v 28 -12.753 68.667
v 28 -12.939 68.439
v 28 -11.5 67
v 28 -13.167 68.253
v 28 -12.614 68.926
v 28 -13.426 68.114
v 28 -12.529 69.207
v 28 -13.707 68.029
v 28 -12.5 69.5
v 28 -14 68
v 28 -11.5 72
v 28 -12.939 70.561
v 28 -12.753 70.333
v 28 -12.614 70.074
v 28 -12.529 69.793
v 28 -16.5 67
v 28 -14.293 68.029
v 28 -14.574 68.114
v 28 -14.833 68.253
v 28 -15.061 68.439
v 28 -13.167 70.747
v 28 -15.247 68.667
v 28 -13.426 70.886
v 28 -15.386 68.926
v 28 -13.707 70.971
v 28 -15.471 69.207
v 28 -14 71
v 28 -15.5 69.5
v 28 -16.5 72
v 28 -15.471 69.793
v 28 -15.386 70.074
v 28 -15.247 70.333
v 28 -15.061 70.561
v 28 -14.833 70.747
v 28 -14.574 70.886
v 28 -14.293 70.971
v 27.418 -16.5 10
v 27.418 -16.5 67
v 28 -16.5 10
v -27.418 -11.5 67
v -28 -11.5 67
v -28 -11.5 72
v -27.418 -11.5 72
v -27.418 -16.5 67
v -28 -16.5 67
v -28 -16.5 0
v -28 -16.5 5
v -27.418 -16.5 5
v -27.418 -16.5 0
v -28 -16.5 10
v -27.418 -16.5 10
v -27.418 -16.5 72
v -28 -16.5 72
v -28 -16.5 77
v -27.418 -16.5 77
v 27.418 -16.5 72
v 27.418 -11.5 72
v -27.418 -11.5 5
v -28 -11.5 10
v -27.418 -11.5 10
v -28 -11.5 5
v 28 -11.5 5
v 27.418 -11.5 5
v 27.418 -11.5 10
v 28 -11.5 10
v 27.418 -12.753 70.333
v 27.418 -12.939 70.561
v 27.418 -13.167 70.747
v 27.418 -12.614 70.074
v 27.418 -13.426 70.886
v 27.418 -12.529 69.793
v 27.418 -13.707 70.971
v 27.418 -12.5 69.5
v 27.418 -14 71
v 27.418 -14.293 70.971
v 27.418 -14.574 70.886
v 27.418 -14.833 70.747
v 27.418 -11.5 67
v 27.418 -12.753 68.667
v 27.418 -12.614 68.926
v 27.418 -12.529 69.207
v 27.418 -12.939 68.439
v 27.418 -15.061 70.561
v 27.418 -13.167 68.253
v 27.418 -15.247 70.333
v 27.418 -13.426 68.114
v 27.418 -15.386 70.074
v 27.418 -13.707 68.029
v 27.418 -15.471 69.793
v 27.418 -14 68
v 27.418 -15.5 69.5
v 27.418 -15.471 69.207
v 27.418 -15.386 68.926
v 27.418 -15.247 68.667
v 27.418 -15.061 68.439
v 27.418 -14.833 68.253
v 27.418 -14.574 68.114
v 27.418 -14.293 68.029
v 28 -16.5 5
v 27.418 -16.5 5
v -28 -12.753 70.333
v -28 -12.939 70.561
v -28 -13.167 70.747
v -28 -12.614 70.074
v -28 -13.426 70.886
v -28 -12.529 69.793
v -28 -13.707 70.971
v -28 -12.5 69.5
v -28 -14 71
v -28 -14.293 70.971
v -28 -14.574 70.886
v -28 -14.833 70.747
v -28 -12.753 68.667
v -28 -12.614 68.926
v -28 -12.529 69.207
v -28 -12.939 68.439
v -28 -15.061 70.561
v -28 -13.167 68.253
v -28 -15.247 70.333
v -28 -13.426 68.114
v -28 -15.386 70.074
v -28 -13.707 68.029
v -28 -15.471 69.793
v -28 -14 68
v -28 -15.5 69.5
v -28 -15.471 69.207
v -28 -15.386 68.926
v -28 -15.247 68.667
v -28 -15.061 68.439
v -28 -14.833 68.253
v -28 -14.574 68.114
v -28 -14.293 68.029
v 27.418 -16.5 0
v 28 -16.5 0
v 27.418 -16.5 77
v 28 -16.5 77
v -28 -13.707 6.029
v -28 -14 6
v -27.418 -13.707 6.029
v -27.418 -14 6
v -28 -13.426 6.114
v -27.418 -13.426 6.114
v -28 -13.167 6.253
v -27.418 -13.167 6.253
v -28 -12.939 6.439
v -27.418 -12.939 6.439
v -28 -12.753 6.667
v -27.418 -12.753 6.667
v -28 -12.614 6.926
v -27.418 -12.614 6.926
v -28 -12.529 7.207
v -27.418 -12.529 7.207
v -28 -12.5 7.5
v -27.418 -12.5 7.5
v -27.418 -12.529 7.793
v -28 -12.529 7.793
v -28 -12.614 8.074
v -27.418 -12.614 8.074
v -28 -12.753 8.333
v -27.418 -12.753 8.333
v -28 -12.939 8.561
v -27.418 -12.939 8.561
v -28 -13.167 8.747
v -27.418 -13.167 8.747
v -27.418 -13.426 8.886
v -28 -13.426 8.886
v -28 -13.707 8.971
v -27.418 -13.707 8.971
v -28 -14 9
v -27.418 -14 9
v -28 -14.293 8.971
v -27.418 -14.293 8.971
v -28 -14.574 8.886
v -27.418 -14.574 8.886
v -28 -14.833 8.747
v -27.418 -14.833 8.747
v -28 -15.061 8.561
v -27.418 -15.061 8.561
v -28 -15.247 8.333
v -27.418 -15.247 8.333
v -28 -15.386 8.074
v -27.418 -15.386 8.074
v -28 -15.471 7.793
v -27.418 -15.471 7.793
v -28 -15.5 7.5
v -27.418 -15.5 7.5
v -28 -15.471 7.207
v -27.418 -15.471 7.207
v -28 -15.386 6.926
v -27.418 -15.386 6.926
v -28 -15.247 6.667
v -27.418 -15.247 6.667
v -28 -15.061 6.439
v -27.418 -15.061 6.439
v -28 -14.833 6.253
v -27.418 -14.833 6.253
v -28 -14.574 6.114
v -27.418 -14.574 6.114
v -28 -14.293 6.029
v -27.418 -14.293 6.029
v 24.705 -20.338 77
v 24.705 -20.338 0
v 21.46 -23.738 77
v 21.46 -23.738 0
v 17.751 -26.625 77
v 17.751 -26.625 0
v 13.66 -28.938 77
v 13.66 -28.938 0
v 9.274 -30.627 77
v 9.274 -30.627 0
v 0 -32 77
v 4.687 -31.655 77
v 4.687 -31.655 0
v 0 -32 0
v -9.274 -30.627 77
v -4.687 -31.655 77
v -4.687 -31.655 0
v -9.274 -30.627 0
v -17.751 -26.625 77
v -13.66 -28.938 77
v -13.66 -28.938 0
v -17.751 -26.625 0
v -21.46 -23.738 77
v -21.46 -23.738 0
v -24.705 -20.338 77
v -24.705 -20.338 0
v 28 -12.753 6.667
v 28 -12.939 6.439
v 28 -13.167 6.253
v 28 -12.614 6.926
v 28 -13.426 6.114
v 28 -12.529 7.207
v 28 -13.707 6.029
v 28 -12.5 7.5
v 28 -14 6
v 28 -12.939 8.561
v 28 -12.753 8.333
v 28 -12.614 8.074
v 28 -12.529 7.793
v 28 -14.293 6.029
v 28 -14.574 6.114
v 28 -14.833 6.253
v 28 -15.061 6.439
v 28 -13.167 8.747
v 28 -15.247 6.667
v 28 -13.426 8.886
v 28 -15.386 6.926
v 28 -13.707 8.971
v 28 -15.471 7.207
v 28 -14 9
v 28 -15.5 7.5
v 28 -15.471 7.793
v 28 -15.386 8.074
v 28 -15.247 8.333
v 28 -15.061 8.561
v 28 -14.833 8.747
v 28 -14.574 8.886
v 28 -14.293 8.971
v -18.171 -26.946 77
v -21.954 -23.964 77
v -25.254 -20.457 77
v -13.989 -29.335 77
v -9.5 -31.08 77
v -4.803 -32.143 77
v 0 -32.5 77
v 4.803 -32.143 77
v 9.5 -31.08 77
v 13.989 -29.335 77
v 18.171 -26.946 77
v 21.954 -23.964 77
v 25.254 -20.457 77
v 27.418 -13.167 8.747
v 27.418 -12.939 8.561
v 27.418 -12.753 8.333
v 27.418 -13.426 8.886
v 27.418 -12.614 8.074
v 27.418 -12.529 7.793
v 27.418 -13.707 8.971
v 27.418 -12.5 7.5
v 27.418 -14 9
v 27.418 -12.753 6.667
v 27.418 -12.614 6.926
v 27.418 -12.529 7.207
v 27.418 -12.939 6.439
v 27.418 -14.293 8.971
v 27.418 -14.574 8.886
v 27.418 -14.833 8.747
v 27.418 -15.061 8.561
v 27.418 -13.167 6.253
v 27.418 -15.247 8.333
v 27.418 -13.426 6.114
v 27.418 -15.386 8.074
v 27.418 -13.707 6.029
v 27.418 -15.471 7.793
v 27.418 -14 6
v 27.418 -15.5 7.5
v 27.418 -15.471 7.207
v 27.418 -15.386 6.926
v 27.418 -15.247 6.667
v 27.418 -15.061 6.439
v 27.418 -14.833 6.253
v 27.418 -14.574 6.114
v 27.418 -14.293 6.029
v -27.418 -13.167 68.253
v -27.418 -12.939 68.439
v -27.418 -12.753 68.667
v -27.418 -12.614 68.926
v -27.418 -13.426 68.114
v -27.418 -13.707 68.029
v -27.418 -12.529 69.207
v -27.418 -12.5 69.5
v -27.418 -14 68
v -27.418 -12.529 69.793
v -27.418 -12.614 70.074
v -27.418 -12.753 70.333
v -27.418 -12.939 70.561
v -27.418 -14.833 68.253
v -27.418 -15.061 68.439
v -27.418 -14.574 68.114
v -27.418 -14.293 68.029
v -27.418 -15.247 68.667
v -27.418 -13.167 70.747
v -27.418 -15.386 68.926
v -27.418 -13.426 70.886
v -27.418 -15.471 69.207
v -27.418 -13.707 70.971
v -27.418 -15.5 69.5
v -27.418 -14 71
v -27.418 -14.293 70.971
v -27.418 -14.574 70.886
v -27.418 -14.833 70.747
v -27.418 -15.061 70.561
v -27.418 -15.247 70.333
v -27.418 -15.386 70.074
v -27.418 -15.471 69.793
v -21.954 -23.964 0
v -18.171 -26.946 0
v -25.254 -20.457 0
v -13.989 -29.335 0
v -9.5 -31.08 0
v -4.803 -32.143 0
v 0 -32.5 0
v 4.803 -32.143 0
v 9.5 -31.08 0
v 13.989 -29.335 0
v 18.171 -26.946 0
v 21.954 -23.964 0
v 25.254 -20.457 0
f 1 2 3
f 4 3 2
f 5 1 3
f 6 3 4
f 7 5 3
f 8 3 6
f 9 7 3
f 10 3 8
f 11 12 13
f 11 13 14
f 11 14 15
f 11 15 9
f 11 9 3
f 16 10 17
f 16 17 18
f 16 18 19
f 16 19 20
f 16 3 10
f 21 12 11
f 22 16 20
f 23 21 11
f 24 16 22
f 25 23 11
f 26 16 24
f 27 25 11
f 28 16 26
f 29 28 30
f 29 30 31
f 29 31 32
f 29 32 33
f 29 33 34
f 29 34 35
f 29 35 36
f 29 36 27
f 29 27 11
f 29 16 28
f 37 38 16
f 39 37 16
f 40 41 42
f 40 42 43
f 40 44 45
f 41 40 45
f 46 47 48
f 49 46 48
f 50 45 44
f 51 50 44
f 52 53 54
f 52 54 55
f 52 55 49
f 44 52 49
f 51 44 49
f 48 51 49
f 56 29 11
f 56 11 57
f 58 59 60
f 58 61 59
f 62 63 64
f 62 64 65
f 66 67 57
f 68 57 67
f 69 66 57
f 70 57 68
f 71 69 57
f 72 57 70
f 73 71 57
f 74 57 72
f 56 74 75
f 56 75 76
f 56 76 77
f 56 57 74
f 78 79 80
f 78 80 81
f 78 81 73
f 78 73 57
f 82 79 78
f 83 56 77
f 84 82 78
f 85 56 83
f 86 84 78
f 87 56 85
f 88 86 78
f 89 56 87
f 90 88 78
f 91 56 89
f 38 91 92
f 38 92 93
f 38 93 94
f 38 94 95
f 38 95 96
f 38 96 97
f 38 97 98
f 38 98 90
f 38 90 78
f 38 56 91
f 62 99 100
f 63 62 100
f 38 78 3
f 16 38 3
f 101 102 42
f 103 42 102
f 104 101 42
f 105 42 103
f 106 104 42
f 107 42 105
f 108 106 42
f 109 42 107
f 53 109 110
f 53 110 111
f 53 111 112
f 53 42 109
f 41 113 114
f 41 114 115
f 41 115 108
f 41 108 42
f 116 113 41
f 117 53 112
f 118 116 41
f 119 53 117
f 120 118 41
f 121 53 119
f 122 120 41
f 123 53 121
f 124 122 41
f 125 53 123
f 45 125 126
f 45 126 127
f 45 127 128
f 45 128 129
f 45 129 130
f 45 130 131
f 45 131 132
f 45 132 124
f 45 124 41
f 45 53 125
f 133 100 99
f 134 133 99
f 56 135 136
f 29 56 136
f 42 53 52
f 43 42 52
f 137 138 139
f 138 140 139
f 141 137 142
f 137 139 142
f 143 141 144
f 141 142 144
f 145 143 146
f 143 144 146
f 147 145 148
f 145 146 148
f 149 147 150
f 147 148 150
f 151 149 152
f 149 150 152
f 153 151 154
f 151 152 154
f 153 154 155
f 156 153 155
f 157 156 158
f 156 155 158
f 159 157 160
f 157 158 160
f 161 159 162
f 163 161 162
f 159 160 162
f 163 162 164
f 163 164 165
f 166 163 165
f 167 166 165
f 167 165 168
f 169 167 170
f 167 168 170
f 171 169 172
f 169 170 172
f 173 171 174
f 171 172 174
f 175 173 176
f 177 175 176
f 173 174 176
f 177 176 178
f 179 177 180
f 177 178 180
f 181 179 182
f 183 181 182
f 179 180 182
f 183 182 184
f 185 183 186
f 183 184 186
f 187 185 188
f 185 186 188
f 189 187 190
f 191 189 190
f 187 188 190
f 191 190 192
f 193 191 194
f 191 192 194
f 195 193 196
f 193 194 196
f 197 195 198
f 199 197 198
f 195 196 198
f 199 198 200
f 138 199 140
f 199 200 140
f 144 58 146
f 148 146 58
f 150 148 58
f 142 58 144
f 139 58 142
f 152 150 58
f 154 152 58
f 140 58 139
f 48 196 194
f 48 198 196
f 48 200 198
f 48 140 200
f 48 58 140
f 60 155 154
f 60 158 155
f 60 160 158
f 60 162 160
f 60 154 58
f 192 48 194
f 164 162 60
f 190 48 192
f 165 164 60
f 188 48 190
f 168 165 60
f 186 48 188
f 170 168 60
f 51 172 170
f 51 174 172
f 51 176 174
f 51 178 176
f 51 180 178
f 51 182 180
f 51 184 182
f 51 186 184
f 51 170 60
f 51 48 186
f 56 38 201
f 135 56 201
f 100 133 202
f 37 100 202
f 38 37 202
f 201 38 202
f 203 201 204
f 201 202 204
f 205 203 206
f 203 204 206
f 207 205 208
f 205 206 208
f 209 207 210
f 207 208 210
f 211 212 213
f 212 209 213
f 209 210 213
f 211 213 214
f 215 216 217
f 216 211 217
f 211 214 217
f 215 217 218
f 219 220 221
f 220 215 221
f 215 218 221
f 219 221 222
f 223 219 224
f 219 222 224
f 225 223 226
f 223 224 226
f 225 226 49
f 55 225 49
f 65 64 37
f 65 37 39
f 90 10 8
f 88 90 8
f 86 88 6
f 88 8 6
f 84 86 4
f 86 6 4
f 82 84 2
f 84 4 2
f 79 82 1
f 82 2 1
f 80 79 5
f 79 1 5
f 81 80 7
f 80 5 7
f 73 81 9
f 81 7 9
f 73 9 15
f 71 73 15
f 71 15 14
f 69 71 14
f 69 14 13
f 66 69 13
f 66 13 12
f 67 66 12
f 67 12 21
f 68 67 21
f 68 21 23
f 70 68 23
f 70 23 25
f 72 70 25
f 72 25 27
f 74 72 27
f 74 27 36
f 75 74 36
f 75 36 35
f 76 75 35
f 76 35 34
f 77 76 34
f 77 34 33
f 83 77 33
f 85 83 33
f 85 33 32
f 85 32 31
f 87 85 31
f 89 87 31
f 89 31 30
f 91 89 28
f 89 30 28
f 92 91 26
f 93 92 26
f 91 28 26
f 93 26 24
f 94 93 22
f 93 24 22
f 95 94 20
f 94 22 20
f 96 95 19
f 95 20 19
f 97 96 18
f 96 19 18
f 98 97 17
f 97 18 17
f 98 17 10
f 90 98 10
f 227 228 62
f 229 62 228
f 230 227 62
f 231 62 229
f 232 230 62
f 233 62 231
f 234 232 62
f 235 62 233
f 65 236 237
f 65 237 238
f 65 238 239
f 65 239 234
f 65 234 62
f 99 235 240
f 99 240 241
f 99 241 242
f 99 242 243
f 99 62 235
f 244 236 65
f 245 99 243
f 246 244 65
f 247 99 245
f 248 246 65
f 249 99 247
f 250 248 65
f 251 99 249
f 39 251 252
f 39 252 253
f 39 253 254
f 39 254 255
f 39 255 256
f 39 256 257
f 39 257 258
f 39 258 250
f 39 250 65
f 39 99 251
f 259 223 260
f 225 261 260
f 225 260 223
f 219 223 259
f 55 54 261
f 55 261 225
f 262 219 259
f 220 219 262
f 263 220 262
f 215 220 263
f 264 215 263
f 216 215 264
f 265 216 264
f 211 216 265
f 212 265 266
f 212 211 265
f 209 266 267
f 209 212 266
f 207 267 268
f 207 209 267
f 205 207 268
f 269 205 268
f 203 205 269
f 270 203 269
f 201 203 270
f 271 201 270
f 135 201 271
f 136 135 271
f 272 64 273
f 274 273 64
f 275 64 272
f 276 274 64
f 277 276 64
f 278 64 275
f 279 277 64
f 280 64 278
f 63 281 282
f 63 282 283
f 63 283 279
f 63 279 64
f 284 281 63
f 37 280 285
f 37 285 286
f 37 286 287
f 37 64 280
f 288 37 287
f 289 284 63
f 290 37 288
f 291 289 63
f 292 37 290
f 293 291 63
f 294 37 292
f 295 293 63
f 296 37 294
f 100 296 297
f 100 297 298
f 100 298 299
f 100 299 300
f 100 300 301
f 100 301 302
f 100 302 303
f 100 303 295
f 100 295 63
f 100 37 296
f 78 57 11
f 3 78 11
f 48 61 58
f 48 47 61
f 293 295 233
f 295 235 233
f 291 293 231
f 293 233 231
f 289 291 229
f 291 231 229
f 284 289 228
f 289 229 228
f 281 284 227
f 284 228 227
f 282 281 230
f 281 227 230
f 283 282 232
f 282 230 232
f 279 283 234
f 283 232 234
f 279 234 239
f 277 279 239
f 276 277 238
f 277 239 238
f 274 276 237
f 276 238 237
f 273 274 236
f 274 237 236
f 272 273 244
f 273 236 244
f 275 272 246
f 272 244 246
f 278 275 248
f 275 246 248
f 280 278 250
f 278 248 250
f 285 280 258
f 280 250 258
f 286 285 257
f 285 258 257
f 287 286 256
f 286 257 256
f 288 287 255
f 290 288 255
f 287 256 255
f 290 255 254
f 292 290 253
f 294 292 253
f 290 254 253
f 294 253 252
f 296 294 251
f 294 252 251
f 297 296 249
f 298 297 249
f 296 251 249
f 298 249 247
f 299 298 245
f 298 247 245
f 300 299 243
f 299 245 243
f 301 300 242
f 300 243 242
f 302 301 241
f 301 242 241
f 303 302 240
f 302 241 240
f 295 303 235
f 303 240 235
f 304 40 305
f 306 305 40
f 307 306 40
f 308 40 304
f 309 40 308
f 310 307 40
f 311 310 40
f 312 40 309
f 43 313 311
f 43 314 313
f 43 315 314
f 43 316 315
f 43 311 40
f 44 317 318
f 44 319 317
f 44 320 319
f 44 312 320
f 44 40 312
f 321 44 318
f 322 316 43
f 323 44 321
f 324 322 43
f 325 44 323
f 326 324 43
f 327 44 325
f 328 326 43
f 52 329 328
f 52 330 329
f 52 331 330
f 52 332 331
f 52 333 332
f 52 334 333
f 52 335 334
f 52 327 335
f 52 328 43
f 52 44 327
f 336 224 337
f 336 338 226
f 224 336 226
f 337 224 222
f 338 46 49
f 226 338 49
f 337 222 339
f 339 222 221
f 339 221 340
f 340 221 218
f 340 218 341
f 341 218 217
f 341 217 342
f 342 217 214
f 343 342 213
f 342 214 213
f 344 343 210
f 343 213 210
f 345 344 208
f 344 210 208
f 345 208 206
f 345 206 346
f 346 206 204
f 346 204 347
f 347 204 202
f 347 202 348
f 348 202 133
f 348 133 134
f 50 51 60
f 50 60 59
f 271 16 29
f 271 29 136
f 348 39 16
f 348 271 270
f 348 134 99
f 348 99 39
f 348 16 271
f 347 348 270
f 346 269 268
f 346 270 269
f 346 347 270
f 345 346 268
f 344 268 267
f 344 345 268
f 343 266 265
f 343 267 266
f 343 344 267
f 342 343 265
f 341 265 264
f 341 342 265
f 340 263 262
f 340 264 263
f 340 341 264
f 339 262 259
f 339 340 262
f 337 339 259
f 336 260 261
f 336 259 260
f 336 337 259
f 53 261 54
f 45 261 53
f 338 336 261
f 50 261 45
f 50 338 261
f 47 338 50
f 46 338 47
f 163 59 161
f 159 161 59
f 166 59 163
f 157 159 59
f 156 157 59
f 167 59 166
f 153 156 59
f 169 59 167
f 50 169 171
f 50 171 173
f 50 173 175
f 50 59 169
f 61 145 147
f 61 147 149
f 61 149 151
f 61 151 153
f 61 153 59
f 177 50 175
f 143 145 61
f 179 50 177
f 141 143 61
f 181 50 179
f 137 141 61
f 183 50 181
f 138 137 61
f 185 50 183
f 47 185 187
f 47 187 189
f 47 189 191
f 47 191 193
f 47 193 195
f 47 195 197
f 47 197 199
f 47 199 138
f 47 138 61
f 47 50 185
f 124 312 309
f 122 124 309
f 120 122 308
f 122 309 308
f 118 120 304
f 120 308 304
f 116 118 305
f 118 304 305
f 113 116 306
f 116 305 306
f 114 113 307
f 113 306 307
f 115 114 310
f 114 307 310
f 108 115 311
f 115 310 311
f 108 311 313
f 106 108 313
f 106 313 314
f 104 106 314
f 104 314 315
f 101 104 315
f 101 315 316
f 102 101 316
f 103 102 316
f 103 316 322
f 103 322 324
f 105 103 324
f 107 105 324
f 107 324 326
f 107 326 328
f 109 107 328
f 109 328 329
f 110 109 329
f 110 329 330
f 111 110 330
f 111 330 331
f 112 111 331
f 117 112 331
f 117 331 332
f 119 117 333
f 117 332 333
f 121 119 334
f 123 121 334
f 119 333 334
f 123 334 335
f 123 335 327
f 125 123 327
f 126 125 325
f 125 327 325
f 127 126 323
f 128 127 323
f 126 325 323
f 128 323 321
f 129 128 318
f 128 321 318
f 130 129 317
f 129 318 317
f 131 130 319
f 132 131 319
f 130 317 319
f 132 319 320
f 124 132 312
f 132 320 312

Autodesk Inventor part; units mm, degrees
ref_plane "YZ Plane" through (0, 0, 0) normal (1, 0, 0) x (0, 1, 0)
ref_plane "XZ Plane" through (0, 0, 0) normal (0, 1, 0) x (-1, 0, 0)
ref_plane "XY Plane" through (0, 0, 0) normal (0, 0, 1) x (1, 0, 0)
sketch "Szkic1" plane through (0, 0, 0) normal (0, 0, 1) x (1, 0, 0)
  circle A0 centre (0, 0) radius 32.5
  circle A1 centre (0, 0) radius 32
  dimension "d0" = 65
  dimension "d1" = 64
extrude "Wyciągnięcie proste1" add sketch "Szkic1" along normal blind 77
sketch "Szkic2" plane through (0, 0, 77) normal (0, 0, 1) x (1, 0, 0)
  line L0 (0, 0) -> (-28, 0)
  line L1 (-28, 0) -> (-28, 15.4919)
  circle A0 centre (0, 0) radius 32 projected
  line L2 (-28, 0) -> (-28, -16.5)
  circle A1 centre (0, 0) radius 32.5 projected
  line L3 (-28, -16.5) -> (28, -16.5)
  line L4 (52.8927, -0.6882) -> (26.703, 44.9724)
  line L5 (26.703, 44.9724) -> (-31.7097, 42.3671)
  line L6 (-31.7097, 42.3671) -> (-48.5067, -13.9887)
  line L7 (-48.5067, -13.9887) -> (-28, -16.5)
  line L8 (28, -16.5) -> (52.8927, -0.6882)
  dimension "d4" = 28
extrude "Wyciągnięcie proste2" cut sketch "Szkic2" against normal blind 77 contours L2 A0 L1 | L1 A0 L3 L2 | A0 L2 A1 L3 | A0 L3 L2 | L7 L6 L5 L4 L8 A1
sketch "Szkic3" plane through (-27.4181, -16.5, 77) normal (0, 1, 0) x (1, 0, 0)
  line L0 (-0.5819, 0) -> (55.4181, 0) projected
  line L1 (-0.5819, 0) -> (-0.5819, 5)
  line L2 (-0.5819, 0) -> (-0.5819, 77) projected
  line L3 (-0.5819, 5) -> (0, 5)
  line L4 (0, 77) -> (0, 0) projected
  line L5 (0, 5) -> (0, 10)
  line L6 (0, 10) -> (-0.5819, 10)
  line L7 (-0.5819, 10) -> (-0.5819, 5)
  line L8 (-0.5819, 77) -> (55.4181, 77) projected
  line L9 (-0.5819, 77) -> (-0.5819, 72)
  line L10 (-0.5819, 72) -> (0, 72)
  line L11 (0, 72) -> (0, 67)
  line L12 (0, 67) -> (-0.5819, 67)
  line L13 (-0.5819, 67) -> (-0.5819, 72)
  line L14 (55.4181, 77) -> (55.4181, 72)
  line L15 (55.4181, 77) -> (55.4181, 0) projected
  line L16 (55.4181, 72) -> (54.8361, 72)
  line L17 (54.8361, 0) -> (54.8361, 77) projected
  line L18 (54.8361, 72) -> (54.8361, 67)
  line L19 (54.8361, 67) -> (55.4181, 67)
  line L20 (55.4181, 67) -> (55.4181, 72)
  line L21 (55.4181, 0) -> (55.4181, 5)
  line L22 (55.4181, 5) -> (54.8361, 5)
  line L23 (54.8361, 5) -> (54.8361, 10)
  line L24 (54.8361, 10) -> (55.4181, 10)
  line L25 (55.4181, 10) -> (55.4181, 5)
  point P0 (27.4181, 77)
  dimension "d7" = 5
  dimension "d8" = 5
  dimension "d9" = 5
  dimension "d10" = 5
  dimension "d11" = 5
  dimension "d12" = 5
  dimension "d13" = 5
  dimension "d14" = 5
extrude "Wyciągnięcie proste3" add sketch "Szkic3" along normal blind 5 contours L2 L6 L4 L3 | L17 L24 L15 L22 | L2 L10 L4 L12 | L17 L16 L15 L19
sketch "Szkic4" plane through (28, -16.5, 67) normal (1, 0, 0) x (0, 0, -1)
  line L0 (57, 0) -> (57, 5) projected
  line L1 (62, 0) -> (62, 5) projected
  line L2 (57, 0) -> (62, 5)
  line L3 (62, 5) -> (57, 5) projected
  line L4 (62, 5) -> (57, 5)
  line L5 (57, 5) -> (62, 0)
  line L6 (0, 0) -> (-5, 0) projected
  line L7 (-5, 5) -> (0, 5) projected
  line L8 (-5, 0) -> (0, 5)
  line L9 (0, 5) -> (-5, 5)
  line L10 (-5, 5) -> (0, 0)
  circle A0 centre (-2.5, 2.5) radius 1.5
  circle A1 centre (59.5, 2.5) radius 1.5
  point P0 (67, 16.5)
  dimension "d17" = 3
  dimension "d18" = 3
extrude "Wyciągnięcie proste4" cut sketch "Szkic4" against normal up to surface (56 mm away) contours A1 L5 L2 | L2 L5 A1 | A1 L2 L5 | L2 A1 L5 | A0 L8 L10 | L10 L8 A0 | A0 L10 L8 | L10 A0 L8
properties part number "Obudowa, większa"
